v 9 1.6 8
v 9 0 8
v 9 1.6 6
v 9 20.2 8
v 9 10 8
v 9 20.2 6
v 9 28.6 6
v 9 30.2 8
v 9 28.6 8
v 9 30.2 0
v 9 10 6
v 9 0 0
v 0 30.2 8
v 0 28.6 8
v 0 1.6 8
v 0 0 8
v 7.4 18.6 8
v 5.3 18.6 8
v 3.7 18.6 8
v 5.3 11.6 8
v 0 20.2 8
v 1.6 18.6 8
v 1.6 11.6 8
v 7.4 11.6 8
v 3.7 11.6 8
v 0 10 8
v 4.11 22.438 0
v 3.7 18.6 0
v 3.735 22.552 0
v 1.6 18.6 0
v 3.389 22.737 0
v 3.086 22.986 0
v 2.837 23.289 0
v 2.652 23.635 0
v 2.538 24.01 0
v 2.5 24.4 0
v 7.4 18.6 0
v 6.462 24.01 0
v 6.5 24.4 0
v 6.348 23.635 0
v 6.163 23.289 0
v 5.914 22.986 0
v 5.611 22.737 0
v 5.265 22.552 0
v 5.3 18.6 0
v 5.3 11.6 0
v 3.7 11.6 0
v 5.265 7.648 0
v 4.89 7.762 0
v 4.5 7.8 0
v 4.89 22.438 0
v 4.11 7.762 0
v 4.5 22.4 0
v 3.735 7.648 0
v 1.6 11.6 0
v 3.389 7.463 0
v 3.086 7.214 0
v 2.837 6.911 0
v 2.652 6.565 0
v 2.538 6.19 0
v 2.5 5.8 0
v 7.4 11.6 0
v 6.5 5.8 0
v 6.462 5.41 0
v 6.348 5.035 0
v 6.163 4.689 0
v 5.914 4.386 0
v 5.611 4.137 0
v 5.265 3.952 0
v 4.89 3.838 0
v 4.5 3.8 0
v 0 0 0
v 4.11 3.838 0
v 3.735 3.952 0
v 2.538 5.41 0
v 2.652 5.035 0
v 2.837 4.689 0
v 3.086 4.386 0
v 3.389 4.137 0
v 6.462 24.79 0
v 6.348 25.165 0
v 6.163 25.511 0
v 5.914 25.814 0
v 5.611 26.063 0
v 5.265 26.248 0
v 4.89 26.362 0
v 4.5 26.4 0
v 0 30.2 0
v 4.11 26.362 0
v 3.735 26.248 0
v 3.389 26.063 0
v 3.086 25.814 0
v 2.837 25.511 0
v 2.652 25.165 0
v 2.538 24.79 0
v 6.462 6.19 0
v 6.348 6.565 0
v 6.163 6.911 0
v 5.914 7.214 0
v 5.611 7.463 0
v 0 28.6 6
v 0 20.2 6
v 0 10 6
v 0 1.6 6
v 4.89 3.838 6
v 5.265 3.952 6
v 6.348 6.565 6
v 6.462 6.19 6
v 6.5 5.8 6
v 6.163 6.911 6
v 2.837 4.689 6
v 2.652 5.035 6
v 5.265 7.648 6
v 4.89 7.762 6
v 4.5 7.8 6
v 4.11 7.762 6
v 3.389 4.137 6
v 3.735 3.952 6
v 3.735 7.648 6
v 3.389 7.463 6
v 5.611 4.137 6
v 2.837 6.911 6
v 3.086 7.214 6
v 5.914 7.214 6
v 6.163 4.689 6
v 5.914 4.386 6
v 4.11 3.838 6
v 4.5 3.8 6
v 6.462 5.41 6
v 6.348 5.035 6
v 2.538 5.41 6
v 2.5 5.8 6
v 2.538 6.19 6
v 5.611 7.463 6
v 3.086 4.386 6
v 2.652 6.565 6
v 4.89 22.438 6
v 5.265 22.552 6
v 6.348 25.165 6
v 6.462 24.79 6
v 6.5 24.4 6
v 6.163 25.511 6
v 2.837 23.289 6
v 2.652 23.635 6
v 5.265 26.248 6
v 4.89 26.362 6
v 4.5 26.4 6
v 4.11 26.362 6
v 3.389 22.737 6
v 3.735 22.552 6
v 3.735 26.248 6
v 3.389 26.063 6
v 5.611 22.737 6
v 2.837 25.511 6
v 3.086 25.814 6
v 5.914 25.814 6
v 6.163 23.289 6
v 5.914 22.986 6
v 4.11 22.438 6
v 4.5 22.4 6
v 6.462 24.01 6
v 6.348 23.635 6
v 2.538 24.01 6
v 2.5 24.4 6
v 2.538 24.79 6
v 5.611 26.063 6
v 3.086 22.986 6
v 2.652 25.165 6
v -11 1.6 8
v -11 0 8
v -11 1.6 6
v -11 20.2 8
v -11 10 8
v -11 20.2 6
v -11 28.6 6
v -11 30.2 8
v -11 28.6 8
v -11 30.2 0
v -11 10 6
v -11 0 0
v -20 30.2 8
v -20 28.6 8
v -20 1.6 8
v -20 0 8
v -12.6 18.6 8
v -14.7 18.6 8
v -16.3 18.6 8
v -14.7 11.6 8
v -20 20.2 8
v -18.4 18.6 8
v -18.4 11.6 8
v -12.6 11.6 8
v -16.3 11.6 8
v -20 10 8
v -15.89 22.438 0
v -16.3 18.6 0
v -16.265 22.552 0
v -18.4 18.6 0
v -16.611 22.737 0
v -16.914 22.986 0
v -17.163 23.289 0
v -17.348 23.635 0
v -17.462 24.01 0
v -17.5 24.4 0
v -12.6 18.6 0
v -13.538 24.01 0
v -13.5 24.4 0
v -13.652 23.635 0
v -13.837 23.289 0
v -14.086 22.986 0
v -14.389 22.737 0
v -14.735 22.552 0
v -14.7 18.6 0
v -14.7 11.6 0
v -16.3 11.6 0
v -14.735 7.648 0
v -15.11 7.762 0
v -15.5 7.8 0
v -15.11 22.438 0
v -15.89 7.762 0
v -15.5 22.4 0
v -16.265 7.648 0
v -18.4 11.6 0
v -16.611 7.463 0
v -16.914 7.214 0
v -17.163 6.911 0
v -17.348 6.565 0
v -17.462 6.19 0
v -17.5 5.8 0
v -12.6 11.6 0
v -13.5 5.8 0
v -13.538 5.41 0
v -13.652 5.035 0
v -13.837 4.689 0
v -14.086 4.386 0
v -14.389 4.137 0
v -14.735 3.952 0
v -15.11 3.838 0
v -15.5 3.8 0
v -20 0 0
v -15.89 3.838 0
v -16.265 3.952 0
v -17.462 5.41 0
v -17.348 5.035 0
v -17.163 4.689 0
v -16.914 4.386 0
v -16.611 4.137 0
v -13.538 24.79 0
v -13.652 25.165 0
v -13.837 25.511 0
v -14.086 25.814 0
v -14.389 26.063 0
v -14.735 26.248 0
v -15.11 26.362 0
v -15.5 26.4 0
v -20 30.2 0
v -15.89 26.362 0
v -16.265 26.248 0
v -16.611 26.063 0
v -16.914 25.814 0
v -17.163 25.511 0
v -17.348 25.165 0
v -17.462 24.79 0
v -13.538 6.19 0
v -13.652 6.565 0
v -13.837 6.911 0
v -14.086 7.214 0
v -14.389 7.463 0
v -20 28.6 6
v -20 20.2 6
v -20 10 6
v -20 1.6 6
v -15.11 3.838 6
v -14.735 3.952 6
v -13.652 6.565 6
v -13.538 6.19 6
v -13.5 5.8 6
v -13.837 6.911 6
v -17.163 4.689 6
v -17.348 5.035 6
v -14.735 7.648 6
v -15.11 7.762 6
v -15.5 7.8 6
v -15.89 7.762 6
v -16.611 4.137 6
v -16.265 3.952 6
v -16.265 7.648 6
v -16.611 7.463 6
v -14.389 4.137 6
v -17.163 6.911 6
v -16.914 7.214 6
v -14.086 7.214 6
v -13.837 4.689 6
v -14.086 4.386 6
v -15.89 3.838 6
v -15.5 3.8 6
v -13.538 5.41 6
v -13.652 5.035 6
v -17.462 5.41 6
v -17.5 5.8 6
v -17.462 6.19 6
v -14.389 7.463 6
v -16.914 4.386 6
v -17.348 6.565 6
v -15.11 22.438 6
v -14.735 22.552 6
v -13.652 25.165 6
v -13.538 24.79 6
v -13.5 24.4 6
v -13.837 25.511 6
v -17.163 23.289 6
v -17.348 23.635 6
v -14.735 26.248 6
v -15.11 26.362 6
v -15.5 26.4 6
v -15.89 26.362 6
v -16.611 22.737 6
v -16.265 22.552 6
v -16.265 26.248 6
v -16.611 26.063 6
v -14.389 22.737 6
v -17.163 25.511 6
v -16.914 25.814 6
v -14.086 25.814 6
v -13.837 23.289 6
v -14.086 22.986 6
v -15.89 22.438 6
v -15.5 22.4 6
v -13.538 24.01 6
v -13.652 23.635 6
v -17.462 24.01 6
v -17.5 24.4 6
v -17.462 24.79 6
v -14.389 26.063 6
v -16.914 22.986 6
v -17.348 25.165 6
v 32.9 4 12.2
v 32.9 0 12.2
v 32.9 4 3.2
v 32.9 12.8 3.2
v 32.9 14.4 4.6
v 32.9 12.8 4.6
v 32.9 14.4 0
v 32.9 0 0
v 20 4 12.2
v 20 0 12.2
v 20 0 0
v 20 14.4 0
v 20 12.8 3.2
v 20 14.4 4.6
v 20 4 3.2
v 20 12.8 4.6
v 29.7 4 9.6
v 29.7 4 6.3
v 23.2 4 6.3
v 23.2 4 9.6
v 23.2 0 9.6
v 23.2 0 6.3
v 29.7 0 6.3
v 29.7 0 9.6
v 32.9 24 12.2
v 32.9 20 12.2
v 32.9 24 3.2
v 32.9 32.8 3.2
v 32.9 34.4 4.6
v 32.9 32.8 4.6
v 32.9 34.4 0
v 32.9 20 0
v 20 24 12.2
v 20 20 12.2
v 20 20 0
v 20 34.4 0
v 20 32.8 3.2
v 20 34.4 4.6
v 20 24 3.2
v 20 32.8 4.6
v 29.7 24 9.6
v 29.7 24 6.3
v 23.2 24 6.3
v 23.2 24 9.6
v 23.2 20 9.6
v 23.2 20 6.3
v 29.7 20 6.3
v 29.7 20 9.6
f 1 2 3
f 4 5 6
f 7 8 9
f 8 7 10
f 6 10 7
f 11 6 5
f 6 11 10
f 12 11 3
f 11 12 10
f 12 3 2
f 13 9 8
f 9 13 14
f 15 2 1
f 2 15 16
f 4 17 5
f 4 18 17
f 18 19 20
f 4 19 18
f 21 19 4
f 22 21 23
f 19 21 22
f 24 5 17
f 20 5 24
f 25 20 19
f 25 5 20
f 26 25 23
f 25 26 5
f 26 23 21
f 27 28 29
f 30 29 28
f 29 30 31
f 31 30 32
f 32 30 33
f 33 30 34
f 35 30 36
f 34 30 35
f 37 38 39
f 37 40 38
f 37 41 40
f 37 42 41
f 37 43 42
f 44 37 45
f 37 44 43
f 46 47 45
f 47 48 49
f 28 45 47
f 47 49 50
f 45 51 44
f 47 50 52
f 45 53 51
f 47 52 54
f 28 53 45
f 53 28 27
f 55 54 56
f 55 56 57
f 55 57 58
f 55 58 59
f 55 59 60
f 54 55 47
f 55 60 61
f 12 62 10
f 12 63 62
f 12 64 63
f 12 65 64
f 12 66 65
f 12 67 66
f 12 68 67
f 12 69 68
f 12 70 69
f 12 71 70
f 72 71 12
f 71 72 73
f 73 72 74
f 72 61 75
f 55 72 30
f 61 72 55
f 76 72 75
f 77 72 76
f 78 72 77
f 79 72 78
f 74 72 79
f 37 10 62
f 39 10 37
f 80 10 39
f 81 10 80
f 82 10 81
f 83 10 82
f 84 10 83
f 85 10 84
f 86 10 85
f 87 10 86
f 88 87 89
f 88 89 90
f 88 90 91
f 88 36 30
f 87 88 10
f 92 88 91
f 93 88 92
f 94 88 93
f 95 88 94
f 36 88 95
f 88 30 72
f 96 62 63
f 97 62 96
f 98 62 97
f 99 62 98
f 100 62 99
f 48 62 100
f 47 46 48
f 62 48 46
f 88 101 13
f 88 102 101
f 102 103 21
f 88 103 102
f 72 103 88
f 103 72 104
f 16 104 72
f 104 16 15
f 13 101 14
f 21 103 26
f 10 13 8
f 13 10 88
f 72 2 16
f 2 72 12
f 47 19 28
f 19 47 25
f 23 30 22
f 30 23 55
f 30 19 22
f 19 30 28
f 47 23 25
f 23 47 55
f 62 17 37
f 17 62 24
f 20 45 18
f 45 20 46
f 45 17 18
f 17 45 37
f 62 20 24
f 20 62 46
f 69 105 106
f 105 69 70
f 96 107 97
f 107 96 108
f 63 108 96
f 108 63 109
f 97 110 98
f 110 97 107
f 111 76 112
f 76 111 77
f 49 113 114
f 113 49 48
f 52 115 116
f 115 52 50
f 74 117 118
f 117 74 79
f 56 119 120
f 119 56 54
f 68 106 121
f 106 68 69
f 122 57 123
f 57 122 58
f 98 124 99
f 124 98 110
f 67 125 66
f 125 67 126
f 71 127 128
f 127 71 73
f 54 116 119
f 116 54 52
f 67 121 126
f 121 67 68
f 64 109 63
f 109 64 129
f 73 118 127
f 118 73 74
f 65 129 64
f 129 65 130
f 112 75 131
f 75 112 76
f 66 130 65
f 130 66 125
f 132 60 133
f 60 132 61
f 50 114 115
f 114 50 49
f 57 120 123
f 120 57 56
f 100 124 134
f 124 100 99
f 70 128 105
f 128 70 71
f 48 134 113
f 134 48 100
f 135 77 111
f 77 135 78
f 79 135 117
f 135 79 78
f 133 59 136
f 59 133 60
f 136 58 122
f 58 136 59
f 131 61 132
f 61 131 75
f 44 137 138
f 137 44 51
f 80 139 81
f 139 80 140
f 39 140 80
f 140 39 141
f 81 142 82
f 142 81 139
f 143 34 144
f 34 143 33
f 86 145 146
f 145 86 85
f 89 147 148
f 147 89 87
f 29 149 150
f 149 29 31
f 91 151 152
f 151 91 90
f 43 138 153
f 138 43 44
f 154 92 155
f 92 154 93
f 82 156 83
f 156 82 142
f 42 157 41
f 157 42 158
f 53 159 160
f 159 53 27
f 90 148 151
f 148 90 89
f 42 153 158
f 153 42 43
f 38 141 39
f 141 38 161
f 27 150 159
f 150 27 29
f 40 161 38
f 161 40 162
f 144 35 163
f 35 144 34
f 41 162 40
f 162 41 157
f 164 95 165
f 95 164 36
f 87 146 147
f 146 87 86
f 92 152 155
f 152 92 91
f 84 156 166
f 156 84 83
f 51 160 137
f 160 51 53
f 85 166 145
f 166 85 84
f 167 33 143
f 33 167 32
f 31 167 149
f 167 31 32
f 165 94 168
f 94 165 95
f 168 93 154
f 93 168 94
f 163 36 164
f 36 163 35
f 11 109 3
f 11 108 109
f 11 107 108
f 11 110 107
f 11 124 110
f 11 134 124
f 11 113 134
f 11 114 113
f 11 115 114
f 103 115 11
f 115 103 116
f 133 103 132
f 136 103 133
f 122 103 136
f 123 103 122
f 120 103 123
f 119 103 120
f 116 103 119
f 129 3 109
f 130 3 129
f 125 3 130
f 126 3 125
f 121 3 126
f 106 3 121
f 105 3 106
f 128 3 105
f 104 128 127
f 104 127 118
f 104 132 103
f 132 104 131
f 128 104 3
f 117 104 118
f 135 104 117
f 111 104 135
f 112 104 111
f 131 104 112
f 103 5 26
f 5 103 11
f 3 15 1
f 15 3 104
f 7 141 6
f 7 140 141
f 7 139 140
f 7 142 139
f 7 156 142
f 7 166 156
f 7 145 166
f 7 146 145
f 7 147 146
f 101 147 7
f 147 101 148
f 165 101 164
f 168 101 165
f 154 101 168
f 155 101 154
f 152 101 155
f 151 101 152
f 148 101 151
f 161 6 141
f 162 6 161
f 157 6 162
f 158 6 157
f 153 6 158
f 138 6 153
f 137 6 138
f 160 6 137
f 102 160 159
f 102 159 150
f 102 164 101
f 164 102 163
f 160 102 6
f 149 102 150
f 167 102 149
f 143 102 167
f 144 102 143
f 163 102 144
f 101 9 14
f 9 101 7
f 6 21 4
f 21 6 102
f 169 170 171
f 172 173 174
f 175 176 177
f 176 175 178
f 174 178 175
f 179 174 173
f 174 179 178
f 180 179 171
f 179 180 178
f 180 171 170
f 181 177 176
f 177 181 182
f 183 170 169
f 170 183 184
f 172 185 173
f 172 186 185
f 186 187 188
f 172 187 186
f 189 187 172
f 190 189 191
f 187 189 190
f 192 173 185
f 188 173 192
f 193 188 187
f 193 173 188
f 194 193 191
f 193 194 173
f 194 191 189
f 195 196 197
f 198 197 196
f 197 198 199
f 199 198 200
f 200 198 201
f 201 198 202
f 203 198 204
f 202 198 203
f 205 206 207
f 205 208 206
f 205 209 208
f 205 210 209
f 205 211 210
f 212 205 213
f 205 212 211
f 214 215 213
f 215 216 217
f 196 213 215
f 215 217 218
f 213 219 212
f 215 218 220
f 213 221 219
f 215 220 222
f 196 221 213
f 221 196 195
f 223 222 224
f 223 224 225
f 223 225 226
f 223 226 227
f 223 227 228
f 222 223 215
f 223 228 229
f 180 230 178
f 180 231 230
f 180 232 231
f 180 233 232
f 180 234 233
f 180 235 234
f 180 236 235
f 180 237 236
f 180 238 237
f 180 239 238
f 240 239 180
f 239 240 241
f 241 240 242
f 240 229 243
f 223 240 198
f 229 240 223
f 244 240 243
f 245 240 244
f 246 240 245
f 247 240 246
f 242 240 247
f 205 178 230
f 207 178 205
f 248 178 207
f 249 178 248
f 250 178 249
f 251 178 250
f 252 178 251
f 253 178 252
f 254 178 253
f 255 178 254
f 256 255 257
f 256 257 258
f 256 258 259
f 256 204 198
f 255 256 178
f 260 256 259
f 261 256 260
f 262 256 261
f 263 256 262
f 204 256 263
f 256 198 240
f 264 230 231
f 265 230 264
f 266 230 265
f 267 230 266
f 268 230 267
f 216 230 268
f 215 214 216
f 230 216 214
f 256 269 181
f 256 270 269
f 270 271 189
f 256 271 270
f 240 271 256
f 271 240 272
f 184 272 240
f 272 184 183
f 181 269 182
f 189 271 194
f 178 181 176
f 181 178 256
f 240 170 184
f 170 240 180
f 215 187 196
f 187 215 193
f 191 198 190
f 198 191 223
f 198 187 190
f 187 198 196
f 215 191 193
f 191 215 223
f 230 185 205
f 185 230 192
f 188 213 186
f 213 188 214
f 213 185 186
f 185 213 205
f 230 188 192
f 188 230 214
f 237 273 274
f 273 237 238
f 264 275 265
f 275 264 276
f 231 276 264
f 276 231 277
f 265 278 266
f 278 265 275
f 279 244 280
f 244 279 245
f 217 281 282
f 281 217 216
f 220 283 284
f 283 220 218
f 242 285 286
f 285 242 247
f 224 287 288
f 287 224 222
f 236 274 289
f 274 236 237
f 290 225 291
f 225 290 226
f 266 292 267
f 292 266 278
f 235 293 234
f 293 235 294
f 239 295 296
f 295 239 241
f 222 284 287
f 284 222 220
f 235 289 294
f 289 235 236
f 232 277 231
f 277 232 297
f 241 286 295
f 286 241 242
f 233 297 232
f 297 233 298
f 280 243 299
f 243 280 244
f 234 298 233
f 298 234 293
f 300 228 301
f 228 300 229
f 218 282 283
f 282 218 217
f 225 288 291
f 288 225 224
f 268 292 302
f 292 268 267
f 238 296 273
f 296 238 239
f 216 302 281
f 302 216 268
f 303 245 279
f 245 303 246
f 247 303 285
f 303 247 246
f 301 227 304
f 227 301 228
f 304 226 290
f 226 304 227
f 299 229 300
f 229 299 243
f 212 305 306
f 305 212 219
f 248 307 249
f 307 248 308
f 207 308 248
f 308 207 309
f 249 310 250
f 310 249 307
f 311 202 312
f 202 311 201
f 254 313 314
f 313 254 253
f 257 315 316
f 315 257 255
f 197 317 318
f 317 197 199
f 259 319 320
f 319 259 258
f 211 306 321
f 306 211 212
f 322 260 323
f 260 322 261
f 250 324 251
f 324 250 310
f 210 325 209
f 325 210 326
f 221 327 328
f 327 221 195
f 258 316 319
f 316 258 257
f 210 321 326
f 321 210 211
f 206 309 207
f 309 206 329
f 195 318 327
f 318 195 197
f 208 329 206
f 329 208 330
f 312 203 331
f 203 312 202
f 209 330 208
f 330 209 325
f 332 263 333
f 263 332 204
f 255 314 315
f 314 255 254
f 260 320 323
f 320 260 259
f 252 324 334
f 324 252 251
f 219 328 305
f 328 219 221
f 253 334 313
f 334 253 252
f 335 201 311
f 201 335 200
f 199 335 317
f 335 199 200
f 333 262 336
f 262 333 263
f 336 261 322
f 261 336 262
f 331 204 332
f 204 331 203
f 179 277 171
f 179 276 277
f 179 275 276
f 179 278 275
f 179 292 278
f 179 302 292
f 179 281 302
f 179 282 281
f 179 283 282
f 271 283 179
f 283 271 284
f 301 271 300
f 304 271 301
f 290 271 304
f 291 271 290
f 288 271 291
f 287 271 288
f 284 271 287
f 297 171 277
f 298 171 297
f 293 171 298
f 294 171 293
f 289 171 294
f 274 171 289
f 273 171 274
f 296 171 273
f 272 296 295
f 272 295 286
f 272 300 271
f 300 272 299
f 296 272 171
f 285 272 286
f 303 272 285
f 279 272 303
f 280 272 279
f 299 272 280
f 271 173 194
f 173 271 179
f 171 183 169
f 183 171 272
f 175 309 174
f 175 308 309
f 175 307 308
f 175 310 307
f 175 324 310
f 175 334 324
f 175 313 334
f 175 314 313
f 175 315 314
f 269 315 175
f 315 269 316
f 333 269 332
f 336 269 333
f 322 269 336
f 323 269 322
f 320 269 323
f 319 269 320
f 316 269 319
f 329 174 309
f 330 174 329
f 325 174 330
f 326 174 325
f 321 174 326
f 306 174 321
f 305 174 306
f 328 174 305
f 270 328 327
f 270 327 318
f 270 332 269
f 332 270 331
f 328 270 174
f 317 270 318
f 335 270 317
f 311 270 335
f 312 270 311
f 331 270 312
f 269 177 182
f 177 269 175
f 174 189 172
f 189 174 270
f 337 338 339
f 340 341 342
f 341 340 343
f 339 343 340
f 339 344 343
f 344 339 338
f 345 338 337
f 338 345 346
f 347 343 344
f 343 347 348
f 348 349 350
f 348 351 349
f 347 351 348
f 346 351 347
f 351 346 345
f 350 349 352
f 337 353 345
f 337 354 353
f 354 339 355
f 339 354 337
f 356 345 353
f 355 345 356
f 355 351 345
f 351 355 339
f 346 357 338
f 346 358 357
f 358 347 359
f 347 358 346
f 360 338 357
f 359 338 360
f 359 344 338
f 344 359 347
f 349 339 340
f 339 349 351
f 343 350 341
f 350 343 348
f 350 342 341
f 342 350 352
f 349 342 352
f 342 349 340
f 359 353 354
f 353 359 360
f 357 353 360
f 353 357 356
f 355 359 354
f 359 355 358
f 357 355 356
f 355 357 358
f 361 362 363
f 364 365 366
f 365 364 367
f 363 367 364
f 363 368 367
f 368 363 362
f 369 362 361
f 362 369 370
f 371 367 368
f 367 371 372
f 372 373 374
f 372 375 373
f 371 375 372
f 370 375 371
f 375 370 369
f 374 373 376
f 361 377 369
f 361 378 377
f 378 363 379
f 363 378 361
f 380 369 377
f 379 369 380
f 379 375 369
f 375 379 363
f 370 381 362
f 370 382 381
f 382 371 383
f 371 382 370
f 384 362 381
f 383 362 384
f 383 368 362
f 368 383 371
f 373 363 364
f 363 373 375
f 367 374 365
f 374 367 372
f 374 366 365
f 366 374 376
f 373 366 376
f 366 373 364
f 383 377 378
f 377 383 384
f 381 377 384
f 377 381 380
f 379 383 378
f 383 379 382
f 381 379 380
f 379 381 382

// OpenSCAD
// belt tightener
// (c) cahorton, 2013:  CC attribution non-commercial

// Description: adujstable belt tensioner with removable clips
// Ok to change these

// (default is sized for GT2)
belt_width = 6;		

// (default is sized for GT2)
belt_height = 1.6;	

// (height of belt when doubled so teeth interlock)
belt_doubled_height = 2.8;	

// Minimum Wall Width
wall = 1.6; 

// extra space in slits, etc
gap = 1; 

// (default sized for a #6 screw)
screw_radius = 2;	

// (default sized for a #6 nut)
nut_radius = 4.2;  	

// (how deep the block slots are)
box_depth = 8;		

// extra space between clip and block, when snapped together
clip_space = .8; 

// extra clearance for belt in the clip slot
clip_gap = .5;

// NOTE: more variables down in the clamp module

// calculated values, don't change these
swall = nut_radius-screw_radius+wall; // wall between screw and slots

box_x = (belt_height  * 2) + (wall * 3)+gap;
box_y = belt_width + gap +  (4*nut_radius)+4*wall;

slot_y = 2*swall+2*screw_radius;

echo("box_x = ", box_x);
echo("box_y = ", box_y);
echo("box_depth = ", box_depth);

module body(){
	difference(){
		
		// body cube
		cube(size=[box_x, box_y, box_depth]);
	
		// slot 1
		translate([wall,slot_y,-1])
		cube(size=[belt_height+gap/2, belt_width+gap, box_depth+2]);
	
		// slot 2
		translate([wall*2+belt_height+gap/2,slot_y,-1])
		cube(size=[belt_height+gap/2, belt_width+gap, box_depth+2]);
	
	
		// screw hole 1
		translate([box_x/2,swall+screw_radius,-1])
		cylinder(r=screw_radius, h=box_x+2, $fn=32);
	
	
		// screw hole 2
		translate([box_x/2,(box_y-(swall+screw_radius)),-1])
		cylinder(r=screw_radius, h=box_x+2, $fn=32);
	
		// nut hole 1
		translate([-1,wall,box_depth-2])
		cube(size=[box_x+2,nut_radius*2, 3]);
	
		// nut hole 2
		translate([-1,box_y-(wall+nut_radius*2),box_depth-2])
		cube(size=[box_x+2,nut_radius*2, 3]);
	
	}
}

body();

translate([-20,0,0])
body();


translate([20,0,0])
clamp();

translate([20,20,0])
clamp();


module clamp(){

	// OK to change these
	clip_gap = .5;
	width = 4;

	// Calculated values, don't change these
	bw = belt_width;
	bx=bw+clip_gap+4*wall;
	by = width;
	bz= box_x+2*wall;

	difference(){
		union(){
			//clamp body
			cube(size=[bx,by,bz]);

			// hook bridge
			cube(size=[bx,clip_space+box_depth+wall+width, 2*wall]);
			
			// hook
			translate([0,clip_space+box_depth+width,wall])
			cube(size=[bx,wall,3]);

		}
	//hole for belt
	translate([2*wall,-1,box_x/2+2*wall-belt_doubled_height/2])
	cube(size=[bw+clip_gap,width+2,belt_doubled_height+clip_gap]);

	}
}
